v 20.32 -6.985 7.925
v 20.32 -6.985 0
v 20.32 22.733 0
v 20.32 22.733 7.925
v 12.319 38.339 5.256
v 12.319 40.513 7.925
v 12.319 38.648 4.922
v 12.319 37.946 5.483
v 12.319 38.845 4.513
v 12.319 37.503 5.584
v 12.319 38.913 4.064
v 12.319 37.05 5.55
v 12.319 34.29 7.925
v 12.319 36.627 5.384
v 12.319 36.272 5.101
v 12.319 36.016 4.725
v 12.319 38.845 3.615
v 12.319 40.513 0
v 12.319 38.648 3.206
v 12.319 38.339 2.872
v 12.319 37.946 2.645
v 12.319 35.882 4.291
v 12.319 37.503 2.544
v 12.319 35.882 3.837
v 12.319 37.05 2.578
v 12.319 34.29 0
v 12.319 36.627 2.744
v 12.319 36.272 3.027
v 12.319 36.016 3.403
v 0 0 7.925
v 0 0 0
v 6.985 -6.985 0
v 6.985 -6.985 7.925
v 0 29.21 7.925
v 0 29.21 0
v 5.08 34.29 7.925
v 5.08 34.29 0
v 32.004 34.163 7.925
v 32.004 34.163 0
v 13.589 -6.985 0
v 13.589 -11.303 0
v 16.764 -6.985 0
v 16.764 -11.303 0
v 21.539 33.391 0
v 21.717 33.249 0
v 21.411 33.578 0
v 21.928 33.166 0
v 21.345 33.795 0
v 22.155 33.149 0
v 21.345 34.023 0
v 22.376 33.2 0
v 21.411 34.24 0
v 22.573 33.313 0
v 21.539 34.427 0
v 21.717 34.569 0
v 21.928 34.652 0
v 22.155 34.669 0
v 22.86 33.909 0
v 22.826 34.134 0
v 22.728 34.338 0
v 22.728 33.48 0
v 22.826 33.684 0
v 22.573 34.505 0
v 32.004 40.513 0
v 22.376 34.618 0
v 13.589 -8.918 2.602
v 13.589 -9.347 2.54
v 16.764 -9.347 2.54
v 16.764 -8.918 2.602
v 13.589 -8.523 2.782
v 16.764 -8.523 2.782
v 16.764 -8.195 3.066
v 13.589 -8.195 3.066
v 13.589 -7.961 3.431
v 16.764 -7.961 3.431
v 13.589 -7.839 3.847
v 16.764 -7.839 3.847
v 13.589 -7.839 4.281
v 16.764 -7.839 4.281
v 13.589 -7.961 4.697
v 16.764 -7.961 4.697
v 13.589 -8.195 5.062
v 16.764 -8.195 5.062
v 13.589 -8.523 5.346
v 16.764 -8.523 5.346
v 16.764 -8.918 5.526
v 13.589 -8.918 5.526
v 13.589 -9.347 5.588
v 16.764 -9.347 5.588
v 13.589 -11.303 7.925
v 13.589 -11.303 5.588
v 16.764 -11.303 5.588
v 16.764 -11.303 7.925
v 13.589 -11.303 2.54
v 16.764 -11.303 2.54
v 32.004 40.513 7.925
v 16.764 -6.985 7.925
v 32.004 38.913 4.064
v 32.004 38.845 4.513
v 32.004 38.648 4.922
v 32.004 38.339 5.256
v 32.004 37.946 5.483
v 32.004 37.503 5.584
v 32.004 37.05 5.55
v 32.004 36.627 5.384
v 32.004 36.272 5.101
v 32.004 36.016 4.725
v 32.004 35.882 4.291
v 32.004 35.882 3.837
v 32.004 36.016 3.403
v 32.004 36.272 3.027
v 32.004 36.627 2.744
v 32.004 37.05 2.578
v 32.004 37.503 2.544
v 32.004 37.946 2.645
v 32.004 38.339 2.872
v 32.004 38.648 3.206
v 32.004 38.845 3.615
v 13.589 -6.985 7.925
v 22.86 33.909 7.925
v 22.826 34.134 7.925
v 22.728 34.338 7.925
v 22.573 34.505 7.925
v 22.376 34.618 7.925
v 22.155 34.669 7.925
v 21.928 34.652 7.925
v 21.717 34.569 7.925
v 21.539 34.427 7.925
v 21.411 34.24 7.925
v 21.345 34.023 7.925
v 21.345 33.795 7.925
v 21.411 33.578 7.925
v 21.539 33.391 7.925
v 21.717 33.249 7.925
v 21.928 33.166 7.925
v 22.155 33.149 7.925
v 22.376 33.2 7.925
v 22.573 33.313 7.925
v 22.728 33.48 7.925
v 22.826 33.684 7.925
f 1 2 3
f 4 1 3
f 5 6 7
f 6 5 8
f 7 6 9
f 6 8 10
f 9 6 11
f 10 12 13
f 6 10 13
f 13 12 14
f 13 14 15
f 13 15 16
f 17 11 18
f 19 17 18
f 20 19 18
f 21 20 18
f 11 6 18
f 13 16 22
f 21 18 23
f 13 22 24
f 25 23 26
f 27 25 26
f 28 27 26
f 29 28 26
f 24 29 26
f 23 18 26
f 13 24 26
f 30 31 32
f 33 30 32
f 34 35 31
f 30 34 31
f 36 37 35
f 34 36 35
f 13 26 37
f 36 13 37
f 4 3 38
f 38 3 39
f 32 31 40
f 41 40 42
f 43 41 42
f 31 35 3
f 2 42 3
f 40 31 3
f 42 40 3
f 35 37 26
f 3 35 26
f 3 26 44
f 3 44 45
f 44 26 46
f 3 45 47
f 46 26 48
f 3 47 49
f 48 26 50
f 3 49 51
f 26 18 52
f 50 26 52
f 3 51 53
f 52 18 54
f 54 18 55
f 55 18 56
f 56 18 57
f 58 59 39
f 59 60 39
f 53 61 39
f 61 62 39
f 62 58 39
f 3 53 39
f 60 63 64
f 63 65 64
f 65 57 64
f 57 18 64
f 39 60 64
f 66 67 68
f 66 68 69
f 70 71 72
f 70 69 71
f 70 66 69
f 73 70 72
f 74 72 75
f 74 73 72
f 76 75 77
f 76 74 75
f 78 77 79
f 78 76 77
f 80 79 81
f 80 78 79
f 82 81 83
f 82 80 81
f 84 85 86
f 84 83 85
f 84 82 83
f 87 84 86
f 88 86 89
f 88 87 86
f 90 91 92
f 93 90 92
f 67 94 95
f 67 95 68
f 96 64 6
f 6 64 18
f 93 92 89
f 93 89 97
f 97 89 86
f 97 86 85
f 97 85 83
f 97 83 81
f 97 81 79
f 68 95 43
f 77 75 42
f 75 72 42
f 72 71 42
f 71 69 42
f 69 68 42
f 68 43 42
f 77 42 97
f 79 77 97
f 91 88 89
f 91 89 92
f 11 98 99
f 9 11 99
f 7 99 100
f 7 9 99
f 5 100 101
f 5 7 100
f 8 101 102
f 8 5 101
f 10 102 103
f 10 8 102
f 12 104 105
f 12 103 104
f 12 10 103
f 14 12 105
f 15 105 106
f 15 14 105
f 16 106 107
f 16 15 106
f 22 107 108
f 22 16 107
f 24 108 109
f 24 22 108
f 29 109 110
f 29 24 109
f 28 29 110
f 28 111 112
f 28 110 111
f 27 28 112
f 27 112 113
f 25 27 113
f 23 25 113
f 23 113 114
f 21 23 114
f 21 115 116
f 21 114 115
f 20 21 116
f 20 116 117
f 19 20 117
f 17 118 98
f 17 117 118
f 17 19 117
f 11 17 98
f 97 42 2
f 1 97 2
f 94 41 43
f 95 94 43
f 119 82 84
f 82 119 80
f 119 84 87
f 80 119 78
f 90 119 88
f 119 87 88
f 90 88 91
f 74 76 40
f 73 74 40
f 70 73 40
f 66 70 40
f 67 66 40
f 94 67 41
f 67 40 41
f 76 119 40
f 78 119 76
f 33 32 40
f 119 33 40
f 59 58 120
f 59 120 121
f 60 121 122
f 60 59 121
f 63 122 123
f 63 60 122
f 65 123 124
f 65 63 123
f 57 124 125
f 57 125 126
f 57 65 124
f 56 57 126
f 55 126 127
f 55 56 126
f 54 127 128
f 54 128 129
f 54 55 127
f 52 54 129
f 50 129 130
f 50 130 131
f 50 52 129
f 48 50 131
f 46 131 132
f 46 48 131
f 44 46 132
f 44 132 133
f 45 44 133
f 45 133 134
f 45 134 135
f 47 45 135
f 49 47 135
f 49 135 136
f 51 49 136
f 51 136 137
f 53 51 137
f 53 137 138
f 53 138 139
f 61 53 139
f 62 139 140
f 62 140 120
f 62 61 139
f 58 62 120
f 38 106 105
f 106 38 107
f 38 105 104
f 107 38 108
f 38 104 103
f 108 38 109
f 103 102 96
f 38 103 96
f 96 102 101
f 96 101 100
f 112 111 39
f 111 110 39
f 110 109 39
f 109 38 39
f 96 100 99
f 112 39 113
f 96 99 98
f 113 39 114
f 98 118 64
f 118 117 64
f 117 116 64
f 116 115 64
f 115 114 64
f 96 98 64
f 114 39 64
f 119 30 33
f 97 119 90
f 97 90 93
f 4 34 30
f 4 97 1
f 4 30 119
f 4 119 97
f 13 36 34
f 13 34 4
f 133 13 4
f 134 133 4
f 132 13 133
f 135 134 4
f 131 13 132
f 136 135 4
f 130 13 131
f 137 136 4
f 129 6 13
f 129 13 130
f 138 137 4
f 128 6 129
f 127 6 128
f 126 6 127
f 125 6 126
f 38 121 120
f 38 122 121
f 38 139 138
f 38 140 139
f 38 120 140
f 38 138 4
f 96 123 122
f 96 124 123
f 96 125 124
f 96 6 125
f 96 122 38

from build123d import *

# Parameters (mm, degrees)
F0_R     = 0.762
F1_DEPTH = 7.9248
F2_R     = 1.524
F3_DEPTH = 32.005


with BuildPart() as f1:
    # F0 (on Top) → F1 (new body)
    with BuildSketch(Plane.XY):
        Polygon((32.004, 34.163), (32.004, 40.513), (12.319, 40.513), (12.319, 34.29), (5.08, 34.29), (0, 29.21), (0, 0), (6.985, -6.985), (13.589, -6.985), (13.589, -11.303), (16.764, -11.303), (16.764, -6.985), (20.32, -6.985), (20.32, 22.733), align=None)
        with Locations((22.098, 33.909)):
            Circle(F0_R, mode=Mode.SUBTRACT)
    extrude(amount=F1_DEPTH)

    # F2 (on Right) → F3 (cut, through all)
    with BuildSketch(Plane.YZ):
        with Locations((37.3888, 4.064)):
            Circle(F2_R)
        with BuildLine():
            Line((-11.303, 2.54), (-9.3472, 2.54))
            ThreePointArc((-9.3472, 2.54), (-7.8232, 4.064), (-9.3472, 5.588))
            Line((-9.3472, 5.588), (-11.303, 5.588))
            Line((-11.303, 5.588), (-11.303, 2.54))
        make_face()
    extrude(amount=F3_DEPTH, mode=Mode.SUBTRACT)


solid = f1.part
